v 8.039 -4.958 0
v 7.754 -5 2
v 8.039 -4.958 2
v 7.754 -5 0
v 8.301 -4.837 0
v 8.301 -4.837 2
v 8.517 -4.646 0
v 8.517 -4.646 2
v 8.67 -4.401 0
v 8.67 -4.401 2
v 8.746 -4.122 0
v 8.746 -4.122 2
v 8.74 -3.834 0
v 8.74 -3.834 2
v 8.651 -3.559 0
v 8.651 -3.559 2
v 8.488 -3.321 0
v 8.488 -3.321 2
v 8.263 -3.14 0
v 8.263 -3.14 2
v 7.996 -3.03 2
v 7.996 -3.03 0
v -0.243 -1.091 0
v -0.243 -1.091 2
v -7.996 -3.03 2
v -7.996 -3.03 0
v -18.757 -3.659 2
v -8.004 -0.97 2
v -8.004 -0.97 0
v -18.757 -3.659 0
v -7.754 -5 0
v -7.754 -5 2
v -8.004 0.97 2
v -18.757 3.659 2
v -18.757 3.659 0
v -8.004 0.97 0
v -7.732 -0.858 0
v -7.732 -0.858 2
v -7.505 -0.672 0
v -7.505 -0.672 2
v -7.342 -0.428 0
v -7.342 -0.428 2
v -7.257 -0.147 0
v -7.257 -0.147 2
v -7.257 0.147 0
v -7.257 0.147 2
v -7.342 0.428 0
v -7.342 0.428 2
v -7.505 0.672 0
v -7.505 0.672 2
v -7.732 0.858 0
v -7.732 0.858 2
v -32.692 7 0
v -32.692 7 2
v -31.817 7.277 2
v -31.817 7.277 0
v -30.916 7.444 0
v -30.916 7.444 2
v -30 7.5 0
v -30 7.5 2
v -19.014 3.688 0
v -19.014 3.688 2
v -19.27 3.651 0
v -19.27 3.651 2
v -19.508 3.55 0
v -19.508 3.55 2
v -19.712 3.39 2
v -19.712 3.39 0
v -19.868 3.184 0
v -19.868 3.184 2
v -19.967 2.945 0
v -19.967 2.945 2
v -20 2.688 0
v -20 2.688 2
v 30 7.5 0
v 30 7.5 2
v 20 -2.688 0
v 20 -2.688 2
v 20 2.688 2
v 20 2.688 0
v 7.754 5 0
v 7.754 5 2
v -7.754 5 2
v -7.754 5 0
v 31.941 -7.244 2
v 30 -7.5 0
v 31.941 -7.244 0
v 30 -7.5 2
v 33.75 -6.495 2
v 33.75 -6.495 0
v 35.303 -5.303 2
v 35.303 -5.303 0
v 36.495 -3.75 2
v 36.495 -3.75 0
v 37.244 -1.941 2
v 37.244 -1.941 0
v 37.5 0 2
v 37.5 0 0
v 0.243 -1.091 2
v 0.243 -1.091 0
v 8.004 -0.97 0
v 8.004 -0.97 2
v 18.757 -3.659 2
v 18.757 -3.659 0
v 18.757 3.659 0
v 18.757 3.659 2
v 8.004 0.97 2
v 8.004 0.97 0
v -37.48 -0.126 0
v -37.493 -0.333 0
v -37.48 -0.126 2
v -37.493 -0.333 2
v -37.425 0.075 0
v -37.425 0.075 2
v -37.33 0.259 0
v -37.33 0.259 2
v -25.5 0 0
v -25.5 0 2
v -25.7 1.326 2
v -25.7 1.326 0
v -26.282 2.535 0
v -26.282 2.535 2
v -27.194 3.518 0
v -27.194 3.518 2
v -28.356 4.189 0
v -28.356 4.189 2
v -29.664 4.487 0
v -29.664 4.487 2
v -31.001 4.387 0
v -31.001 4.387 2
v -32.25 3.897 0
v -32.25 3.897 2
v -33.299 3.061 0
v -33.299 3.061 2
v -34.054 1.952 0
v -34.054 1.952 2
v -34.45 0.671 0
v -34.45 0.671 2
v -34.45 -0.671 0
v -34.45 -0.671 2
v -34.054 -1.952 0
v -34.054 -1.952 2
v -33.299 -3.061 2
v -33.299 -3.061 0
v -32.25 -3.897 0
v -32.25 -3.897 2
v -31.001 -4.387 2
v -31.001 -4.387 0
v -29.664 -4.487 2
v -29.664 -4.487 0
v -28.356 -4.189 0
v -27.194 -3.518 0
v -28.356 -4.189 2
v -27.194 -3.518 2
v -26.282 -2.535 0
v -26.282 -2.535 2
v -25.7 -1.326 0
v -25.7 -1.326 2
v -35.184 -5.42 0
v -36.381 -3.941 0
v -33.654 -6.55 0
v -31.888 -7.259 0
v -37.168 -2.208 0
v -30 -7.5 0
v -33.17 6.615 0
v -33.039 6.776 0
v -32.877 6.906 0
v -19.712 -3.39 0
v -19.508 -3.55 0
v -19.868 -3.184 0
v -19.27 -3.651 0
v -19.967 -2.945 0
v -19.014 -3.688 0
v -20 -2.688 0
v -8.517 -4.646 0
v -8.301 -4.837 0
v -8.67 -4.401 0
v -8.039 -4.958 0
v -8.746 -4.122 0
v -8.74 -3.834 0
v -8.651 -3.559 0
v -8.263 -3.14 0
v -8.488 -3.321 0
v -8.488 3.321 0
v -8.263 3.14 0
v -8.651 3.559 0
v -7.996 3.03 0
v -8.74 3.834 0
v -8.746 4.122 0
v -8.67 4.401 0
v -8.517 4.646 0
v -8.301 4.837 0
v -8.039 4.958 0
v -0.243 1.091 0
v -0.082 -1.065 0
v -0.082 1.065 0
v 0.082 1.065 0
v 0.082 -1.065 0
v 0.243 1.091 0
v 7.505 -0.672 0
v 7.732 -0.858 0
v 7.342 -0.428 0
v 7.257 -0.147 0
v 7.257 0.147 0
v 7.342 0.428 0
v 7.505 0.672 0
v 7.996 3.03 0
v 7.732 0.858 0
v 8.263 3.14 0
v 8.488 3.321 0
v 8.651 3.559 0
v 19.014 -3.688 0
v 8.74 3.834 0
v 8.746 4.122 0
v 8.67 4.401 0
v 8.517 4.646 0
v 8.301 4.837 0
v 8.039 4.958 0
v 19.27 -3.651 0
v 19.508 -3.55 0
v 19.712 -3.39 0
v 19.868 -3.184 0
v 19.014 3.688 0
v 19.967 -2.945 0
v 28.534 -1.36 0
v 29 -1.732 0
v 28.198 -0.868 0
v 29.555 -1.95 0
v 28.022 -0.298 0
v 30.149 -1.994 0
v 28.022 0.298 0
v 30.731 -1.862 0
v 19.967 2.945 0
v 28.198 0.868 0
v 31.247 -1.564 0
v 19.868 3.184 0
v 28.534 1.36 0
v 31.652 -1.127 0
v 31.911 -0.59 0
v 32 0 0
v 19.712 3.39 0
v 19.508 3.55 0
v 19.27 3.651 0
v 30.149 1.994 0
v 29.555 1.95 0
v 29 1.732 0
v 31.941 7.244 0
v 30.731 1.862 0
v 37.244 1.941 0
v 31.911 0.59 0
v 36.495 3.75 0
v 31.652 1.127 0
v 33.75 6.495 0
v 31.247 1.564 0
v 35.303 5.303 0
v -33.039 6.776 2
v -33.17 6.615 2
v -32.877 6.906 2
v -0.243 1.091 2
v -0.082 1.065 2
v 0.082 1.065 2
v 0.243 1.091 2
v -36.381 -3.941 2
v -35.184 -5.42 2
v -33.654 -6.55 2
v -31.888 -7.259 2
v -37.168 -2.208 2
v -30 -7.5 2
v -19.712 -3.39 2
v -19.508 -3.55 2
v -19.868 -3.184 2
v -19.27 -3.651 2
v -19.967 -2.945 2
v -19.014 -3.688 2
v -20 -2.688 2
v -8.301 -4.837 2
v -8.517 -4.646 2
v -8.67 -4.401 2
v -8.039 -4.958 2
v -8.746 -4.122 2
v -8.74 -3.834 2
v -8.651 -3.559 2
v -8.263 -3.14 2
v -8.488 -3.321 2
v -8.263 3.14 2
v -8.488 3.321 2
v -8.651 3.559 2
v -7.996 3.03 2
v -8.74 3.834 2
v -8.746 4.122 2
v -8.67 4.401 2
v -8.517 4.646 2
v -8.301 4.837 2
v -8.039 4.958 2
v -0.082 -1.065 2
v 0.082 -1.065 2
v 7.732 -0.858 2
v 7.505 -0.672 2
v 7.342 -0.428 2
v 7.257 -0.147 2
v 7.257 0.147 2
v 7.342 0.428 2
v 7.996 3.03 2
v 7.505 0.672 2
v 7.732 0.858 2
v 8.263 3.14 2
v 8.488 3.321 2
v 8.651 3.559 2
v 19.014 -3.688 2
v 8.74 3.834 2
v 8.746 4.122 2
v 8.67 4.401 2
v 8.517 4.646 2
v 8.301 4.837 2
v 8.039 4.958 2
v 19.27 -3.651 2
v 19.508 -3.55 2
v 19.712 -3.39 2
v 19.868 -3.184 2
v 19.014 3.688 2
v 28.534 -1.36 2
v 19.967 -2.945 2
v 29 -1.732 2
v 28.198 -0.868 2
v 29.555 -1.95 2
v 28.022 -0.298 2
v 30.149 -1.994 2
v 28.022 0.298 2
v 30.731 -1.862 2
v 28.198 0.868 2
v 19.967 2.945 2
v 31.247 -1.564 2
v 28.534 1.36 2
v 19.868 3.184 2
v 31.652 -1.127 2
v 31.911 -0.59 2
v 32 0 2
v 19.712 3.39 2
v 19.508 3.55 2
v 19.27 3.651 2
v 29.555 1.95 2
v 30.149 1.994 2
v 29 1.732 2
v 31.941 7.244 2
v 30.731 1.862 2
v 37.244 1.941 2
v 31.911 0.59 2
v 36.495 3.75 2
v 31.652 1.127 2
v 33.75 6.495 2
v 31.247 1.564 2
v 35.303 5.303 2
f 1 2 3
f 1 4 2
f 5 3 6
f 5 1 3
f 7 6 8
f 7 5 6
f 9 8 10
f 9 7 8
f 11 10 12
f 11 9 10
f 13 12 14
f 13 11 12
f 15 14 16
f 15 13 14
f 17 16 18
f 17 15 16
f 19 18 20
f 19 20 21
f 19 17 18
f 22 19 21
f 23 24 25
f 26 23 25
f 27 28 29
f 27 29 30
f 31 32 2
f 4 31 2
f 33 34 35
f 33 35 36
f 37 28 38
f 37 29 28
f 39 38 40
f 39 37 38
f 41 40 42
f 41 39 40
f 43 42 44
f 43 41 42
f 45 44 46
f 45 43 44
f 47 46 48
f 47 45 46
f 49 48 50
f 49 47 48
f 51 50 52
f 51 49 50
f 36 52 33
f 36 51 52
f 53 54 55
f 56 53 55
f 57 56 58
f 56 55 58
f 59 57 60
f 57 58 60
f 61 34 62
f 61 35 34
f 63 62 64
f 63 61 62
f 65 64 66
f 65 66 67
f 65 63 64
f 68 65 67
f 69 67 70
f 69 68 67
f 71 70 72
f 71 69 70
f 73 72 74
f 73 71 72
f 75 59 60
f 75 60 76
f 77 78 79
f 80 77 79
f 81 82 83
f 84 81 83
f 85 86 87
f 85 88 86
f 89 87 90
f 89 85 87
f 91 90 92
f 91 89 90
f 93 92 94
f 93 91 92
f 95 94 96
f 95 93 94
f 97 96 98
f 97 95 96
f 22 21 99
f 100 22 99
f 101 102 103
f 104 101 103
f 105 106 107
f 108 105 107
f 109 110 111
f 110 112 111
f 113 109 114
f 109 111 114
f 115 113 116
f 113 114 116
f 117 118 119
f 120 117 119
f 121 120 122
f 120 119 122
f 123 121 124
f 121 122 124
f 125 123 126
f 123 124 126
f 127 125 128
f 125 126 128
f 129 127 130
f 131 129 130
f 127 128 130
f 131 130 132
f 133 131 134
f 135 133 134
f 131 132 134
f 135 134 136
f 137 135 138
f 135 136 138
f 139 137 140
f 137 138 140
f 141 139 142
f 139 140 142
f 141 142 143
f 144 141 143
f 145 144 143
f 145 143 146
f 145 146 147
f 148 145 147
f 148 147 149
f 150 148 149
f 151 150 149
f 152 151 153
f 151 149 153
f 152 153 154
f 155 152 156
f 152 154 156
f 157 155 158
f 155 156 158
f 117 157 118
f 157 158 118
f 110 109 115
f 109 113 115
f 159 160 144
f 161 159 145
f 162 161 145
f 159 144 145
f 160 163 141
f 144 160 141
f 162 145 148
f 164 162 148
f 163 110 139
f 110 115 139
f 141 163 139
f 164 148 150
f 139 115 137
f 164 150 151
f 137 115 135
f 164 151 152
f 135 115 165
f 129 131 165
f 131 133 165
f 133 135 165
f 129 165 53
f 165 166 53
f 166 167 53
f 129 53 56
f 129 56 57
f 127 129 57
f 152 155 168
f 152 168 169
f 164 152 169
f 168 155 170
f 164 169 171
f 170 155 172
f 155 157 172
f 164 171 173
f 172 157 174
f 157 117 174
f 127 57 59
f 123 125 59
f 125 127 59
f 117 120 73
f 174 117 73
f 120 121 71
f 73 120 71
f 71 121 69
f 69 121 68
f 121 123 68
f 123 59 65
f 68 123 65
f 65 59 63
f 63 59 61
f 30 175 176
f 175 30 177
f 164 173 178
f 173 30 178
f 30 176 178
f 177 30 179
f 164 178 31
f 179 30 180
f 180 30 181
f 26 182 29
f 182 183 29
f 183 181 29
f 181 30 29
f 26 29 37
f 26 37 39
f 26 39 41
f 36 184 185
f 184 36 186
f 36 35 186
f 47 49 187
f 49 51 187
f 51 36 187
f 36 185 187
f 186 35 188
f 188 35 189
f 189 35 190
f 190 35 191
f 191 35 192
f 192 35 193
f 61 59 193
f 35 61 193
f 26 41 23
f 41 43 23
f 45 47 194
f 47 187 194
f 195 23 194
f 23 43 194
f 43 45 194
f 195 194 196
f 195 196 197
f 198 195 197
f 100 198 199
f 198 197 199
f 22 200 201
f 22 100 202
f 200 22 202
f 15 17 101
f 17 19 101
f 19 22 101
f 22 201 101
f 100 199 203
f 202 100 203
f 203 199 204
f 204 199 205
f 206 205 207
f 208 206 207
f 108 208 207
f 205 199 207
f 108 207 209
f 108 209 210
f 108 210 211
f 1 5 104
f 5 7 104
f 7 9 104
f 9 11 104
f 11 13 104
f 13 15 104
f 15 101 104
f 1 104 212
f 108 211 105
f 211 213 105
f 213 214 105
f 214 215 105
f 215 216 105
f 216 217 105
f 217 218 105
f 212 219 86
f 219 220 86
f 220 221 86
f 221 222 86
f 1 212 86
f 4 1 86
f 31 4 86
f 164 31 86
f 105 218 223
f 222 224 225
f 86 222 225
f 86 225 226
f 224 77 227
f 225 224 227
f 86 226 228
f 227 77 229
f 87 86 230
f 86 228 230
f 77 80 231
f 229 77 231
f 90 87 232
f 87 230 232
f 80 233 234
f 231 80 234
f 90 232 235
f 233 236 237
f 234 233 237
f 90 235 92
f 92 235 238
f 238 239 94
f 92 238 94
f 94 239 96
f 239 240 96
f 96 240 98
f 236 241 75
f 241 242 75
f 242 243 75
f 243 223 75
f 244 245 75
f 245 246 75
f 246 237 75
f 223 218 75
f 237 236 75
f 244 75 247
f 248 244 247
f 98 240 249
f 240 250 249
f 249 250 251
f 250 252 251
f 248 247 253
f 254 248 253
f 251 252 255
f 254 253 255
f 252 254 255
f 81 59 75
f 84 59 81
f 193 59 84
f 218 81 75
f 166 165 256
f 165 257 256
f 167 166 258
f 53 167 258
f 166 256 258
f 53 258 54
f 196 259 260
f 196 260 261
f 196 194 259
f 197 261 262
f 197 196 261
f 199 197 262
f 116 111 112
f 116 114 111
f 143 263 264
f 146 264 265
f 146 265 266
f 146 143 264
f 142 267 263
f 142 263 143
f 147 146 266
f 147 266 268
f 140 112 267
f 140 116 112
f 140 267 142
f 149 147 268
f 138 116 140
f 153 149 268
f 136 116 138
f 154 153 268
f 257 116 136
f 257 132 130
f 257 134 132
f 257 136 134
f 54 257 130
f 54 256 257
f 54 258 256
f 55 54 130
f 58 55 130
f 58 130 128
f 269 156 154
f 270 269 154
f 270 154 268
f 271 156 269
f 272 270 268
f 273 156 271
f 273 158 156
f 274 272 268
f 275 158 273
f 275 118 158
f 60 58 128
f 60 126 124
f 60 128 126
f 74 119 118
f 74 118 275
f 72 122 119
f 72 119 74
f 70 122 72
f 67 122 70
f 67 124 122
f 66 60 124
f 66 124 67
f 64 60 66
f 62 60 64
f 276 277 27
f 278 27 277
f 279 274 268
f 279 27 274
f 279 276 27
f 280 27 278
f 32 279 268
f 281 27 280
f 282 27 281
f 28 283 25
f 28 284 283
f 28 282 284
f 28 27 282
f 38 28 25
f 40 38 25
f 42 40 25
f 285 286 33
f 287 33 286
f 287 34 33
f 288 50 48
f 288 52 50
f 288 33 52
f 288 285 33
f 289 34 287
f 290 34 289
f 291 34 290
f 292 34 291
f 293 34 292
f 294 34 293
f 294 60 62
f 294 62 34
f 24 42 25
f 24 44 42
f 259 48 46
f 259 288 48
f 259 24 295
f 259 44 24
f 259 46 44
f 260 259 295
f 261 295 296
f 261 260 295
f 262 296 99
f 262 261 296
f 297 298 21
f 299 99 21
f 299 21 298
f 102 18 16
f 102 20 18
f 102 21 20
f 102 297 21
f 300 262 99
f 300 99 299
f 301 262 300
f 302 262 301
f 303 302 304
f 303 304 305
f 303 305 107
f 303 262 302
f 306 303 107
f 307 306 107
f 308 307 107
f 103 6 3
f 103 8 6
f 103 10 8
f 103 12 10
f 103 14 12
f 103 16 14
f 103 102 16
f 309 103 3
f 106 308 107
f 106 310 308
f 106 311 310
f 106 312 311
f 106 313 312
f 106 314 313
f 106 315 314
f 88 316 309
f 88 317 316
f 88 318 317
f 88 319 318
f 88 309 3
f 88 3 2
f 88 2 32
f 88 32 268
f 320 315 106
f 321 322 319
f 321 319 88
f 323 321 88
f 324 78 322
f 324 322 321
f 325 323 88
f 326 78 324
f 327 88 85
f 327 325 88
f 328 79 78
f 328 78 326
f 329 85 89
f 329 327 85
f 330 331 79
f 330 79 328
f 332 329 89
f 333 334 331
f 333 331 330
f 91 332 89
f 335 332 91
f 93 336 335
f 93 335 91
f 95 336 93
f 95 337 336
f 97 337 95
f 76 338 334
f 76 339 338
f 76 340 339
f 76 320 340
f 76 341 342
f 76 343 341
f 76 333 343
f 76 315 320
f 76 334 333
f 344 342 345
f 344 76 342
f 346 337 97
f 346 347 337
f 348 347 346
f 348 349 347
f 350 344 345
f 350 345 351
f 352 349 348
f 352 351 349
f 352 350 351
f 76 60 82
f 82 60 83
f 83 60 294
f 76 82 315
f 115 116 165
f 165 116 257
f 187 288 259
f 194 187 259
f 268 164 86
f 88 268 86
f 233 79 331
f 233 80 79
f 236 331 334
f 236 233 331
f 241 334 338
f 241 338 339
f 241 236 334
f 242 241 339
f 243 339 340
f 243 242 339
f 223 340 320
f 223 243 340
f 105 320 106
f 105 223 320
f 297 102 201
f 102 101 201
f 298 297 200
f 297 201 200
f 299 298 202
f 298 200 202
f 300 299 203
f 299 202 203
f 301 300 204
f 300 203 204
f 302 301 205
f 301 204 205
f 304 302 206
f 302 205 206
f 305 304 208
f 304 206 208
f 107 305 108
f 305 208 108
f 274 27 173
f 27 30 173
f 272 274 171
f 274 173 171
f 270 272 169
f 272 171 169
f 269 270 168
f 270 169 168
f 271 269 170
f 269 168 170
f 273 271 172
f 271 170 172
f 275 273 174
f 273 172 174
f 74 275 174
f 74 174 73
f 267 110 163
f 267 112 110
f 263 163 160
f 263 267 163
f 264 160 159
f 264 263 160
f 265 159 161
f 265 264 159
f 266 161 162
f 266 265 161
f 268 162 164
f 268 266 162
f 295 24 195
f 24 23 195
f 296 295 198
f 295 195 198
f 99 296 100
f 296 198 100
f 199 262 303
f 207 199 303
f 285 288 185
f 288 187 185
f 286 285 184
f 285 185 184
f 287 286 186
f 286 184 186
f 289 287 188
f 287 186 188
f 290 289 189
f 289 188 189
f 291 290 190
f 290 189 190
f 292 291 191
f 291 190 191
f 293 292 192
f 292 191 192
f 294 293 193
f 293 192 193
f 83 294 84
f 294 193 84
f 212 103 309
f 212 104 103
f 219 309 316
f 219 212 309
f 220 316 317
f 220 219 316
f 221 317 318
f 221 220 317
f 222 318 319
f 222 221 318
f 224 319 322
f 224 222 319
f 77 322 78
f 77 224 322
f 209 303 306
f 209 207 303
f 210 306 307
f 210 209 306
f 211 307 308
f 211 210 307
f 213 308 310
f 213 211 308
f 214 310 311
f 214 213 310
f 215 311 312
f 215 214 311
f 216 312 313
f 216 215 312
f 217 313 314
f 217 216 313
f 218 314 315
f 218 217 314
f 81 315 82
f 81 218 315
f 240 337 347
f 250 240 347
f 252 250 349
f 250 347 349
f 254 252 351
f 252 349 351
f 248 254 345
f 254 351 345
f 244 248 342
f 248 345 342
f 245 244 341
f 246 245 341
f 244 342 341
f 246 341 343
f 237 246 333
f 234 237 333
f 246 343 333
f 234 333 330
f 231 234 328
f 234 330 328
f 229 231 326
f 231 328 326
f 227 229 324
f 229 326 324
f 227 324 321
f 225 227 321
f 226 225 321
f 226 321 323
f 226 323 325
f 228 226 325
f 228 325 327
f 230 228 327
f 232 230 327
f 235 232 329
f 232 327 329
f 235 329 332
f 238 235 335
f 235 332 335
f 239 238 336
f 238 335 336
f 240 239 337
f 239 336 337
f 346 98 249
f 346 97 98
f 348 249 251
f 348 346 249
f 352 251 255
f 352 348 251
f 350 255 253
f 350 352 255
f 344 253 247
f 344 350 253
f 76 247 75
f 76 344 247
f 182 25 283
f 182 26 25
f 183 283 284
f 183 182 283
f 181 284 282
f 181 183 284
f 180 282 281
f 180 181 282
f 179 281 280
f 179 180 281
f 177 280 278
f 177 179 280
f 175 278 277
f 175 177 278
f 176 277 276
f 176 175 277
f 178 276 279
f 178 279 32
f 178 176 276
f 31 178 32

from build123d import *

# Parameters (mm, degrees)
SKETCH_1_W              = 75
SKETCH_1_H              = 15
EXTRUDE_1_DEPTH         = 2
FILLET_1_R              = 7.5
SKETCH_2_R              = 2
SKETCH_2_R_2            = 4.5
CUT_EXTRUDE_1_DEPTH     = 2
CUT_EXTRUDE_2_DEPTH     = 10
FILLET_2_R              = 1
CUT_EXTRUDE_START       = -34
CUT_EXTRUDE_3_OUTLINE_W = 11
CUT_EXTRUDE_3_OUTLINE_H = 4
CUT_EXTRUDE_3_DEPTH     = 2.625249005
FILLET_3_R              = 1


with BuildPart() as part:
    # 草图1 → 凸台-拉伸1 (new body)
    with BuildSketch(Plane.XY):
        Rectangle(SKETCH_1_W, SKETCH_1_H)
    extrude(amount=EXTRUDE_1_DEPTH)

    # 圆角1
    fillet_1_edges = [part.edges().sort_by_distance(p)[0] for p in [
        (37.5, -7.5, 1),
        (-37.5, -7.5, 1),
        (-37.5, 7.5, 1),
        (37.5, 7.5, 1),
    ]]
    fillet(fillet_1_edges, radius=FILLET_1_R - 0.0001)  # a hair under: the kernel refuses the full size

    # 草图2 → 切除-拉伸1 (cut)
    with BuildSketch(Plane.XY.offset(2)):
        with Locations((30, 0)):
            Circle(SKETCH_2_R)
        with Locations((-30, 0)):
            Circle(SKETCH_2_R_2)
    extrude(amount=-CUT_EXTRUDE_1_DEPTH, mode=Mode.SUBTRACT)

    # 草图3 → 切除-拉伸2 (cut)
    with BuildSketch(Plane.XY.offset(2)):
        Polygon((-20, -3.969223594), (-20, 3.969223594), (-4.123105626, 0), align=None)
        Polygon((-15.876894374, 5), (0, 1.030776406), (15.876894374, 5), align=None)
        Polygon((0, -1.030776406), (-15.876894374, -5), (15.876894374, -5), align=None)
        Polygon((4.123105626, 0), (20, -3.969223594), (20, 3.969223594), align=None)
    extrude(amount=-CUT_EXTRUDE_2_DEPTH, mode=Mode.SUBTRACT)

    # 圆角2
    fillet_2_edges = [part.edges().sort_by_distance(p)[0] for p in [
        (-20, -3.969223594, 1),
        (-20, 3.969223594, 1),
        (-4.123105626, 0, 1),
        (0, -1.030776406, 1),
        (15.876894374, -5, 1),
        (-15.876894374, -5, 1),
        (4.123105626, 0, 1),
        (20, 3.969223594, 1),
        (20, -3.969223594, 1),
        (0, 1.030776406, 1),
        (-15.876894374, 5, 1),
        (15.876894374, 5, 1),
    ]]
    fillet(fillet_2_edges, radius=FILLET_2_R)

    # 切除-拉伸3: read off the stored shape, not the designer's step
    # 切除-拉伸3 outline → 切除-拉伸3 (cut)
    with BuildSketch(Plane(origin=(0, 0, 0), x_dir=(0.5477225575051656, 0.8366600265340758, 0), z_dir=(0.8366600265340758, -0.5477225575051659, 0)).offset(CUT_EXTRUDE_START)):
        with Locations((-16.5, 1)):
            Rectangle(CUT_EXTRUDE_3_OUTLINE_W, CUT_EXTRUDE_3_OUTLINE_H)
    extrude(amount=CUT_EXTRUDE_3_DEPTH, mode=Mode.SUBTRACT)

    # 圆角3
    fillet_3_edges = [part.edges().sort_by_distance(p)[0] for p in [
        (-32.999968349, 6.87391189, 1),
        (-37.5, 0, 1),
    ]]
    fillet(fillet_3_edges, radius=FILLET_3_R)


solid = part.part
